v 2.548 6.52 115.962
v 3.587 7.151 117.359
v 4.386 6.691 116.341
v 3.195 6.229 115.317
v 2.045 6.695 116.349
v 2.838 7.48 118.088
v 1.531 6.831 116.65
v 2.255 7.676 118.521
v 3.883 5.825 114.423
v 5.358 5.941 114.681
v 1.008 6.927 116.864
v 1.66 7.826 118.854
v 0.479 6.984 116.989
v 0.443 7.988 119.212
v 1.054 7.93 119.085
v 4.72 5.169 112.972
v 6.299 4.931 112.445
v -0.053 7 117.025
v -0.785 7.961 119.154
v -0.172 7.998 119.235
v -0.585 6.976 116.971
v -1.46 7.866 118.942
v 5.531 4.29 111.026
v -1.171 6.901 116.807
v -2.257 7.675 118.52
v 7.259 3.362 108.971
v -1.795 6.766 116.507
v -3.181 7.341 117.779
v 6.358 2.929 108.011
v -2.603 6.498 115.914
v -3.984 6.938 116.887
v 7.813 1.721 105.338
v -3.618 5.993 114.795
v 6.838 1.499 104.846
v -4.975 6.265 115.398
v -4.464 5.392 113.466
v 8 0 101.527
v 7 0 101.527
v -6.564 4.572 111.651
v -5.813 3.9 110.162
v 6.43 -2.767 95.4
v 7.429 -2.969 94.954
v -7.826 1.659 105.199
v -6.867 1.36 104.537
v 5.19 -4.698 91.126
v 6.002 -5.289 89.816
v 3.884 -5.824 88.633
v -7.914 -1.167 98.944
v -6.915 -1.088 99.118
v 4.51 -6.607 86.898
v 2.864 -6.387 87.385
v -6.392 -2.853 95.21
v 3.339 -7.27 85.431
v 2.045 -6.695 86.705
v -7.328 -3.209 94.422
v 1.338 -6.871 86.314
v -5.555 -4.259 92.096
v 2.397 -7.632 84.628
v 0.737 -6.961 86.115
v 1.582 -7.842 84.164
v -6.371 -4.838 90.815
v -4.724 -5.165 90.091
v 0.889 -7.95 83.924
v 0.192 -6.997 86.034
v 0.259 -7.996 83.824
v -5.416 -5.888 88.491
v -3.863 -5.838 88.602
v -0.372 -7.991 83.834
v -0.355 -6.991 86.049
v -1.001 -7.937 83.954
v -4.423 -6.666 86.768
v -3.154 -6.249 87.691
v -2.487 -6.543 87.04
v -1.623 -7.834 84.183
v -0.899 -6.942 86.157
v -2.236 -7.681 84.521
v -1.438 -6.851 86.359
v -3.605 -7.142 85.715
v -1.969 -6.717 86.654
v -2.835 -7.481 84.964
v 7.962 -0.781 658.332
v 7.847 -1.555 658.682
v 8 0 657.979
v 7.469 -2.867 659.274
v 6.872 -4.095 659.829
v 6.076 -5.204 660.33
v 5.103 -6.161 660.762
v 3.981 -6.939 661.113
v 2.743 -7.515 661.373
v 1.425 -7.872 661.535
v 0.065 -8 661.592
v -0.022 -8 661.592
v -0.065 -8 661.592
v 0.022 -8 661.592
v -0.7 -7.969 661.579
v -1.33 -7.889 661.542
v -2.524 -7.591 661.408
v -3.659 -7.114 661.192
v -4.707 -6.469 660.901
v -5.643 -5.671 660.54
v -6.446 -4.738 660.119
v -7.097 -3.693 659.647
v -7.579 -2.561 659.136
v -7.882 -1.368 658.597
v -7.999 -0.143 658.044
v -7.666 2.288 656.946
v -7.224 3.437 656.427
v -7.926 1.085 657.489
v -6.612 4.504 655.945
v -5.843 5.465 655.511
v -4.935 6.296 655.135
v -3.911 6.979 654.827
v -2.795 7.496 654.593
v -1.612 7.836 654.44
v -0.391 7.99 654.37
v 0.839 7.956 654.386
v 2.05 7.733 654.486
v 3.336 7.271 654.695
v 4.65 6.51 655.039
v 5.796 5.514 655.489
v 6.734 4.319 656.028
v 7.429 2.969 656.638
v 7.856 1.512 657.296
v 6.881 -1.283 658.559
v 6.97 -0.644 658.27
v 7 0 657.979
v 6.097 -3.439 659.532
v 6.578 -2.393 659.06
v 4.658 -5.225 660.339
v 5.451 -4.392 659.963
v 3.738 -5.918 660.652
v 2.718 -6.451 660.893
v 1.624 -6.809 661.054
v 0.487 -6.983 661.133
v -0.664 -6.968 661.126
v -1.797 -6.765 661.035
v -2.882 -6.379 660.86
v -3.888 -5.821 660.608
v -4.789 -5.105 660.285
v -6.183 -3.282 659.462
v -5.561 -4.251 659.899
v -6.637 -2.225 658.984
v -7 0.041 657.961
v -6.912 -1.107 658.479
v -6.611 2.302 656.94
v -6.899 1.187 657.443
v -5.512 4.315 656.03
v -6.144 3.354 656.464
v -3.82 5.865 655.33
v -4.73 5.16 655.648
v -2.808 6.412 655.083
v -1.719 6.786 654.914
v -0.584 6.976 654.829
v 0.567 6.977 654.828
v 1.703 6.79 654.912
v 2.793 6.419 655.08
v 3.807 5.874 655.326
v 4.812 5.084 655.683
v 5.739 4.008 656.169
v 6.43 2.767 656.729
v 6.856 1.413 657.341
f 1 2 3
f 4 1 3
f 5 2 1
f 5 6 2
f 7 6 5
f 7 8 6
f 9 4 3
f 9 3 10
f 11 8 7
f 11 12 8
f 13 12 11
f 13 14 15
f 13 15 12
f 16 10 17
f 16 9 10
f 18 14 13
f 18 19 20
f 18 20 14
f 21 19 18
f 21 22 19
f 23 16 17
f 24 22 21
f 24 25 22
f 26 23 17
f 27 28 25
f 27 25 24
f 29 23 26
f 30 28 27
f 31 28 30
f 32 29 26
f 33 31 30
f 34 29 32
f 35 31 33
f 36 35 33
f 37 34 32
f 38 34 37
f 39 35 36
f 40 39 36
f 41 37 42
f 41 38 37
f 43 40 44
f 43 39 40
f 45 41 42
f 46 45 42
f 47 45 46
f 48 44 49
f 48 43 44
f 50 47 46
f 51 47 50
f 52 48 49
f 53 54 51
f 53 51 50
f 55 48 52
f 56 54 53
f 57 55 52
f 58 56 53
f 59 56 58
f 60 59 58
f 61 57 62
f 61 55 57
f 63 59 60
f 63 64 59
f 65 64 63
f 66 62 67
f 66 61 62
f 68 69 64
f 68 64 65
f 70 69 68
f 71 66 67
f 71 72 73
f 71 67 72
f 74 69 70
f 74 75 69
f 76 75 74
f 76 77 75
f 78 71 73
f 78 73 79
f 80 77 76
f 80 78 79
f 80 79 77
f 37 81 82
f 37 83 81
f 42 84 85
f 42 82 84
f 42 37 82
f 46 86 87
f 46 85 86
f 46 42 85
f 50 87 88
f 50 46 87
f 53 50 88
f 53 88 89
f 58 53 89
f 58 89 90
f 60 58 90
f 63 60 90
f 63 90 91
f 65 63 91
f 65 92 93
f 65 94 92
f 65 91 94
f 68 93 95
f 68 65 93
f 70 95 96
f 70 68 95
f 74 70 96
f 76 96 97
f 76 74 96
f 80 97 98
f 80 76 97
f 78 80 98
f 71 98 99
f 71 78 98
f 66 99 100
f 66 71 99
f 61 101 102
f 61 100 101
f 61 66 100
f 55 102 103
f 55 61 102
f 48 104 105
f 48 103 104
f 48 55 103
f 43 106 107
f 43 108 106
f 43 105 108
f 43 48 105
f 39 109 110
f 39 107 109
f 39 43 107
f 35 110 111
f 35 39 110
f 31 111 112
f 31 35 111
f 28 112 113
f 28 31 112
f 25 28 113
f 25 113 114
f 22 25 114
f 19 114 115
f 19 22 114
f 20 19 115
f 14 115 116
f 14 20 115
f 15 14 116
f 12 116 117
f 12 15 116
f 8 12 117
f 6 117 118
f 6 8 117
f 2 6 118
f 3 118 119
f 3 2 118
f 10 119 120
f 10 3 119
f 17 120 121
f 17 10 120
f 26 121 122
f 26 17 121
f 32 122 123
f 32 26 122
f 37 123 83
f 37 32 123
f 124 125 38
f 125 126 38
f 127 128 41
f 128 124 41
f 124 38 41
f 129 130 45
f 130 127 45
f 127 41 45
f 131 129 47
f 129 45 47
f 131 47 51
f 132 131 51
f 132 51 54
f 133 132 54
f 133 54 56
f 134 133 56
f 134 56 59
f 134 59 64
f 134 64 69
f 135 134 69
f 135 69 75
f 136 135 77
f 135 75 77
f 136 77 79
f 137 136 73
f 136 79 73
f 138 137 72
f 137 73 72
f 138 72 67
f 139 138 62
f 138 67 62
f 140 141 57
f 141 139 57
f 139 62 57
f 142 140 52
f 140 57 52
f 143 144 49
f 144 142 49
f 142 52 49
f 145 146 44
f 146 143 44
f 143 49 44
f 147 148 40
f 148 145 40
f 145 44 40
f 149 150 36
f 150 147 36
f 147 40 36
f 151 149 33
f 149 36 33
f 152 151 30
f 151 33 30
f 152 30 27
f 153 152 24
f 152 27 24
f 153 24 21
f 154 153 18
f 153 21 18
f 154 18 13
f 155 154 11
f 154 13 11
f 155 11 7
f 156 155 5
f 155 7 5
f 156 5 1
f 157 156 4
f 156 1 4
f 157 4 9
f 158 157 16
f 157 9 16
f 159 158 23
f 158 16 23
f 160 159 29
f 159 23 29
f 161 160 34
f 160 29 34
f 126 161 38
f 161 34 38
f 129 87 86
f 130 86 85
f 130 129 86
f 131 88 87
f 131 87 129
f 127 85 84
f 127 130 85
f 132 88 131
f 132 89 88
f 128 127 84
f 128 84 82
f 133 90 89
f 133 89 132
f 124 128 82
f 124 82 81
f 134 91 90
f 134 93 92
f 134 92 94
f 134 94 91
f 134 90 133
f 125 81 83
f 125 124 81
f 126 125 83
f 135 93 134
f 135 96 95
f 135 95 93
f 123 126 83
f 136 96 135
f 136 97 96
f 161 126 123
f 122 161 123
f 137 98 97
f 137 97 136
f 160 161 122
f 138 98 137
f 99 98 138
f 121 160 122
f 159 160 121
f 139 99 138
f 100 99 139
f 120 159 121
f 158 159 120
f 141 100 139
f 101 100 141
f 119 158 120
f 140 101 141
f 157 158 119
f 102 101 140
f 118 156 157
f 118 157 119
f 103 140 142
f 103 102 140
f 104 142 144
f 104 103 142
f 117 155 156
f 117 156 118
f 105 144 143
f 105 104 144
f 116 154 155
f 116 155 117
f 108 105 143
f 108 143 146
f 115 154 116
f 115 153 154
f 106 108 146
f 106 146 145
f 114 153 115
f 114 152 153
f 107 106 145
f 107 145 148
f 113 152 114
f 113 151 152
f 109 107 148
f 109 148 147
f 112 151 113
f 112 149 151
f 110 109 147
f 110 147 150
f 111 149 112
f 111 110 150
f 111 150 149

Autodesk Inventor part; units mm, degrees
ref_plane "Начальная плоскость" through (0, 0, 83.8145) normal (0, 0, 1) x (1, 0, 0)
ref_plane "Конечная плоскость" through (0, 0, 661.5924) normal (0, 0, 1) x (1, 0, 0)
sketch "Эскиз" plane through (0, 0, 0) normal (0, 0, 1) x (1, 0, 0)
  circle A0 centre (0, 0) radius 7
  circle A1 centre (0, 0) radius 8
  dimension "d0" = 16
  dimension "d1" = 1
extrude "Тело" add sketch "Эскиз" along normal up to surface (577.7778 mm away) from surface at 83.8145
sketch "Sketch3" plane through (0, 0, 0) normal (0, 0, 1) x (1, 0, 0)
  line L0 (0, 0) -> (10, 0)
ref_plane "Work Plane3" through (0, 0, 0) normal (0, -1, 0) x (1, 0, 0)
sketch "Sketch4" plane through (0, 0, 0) normal (0, -1, 0) x (1, 0, 0)
  line L0 (-2, 83.8145) -> (12, 83.8145)
  line L1 (-2, 661.5924) -> (12, 661.5924)
  dimension "d7" = 577.7778
ref_plane "РабПлоскость4" through (-8, 209.5676, 565.5202) normal (0, 0.9113542, -0.4116231) x (1, 0, 0)
split "Разделение1" plane through (-8, 209.5676, 565.5202) removes the side toward (0, 0.9113542, -0.4116231)
ref_plane "РабПлоскость5" through (57, 468.0246, 446.5907) normal (0, 0.4116231, 0.9113542) x (1, 0, 0)
split "Разделение2" plane through (57, 468.0246, 446.5907) removes the side toward (0, 0.4116231, 0.9113542)
equation "\"d0\" = G_H"
equation "\"d1\" = G_T"
equation "\"d2\" = G_L"
equation "\"G_H\" = 16"
equation "\"G_T\" = 1"
equation "\"G_L\" = d7"
equation "\"G_OFFSET_START\" = -83.81455"
equation "\"G_OFFSET_END\" = -2.19454"
equation "\"d4\" = -G_OFFSET_START"
equation "\"d5\" = G_OFFSET_END + B_L"
equation "\"B_L\" = 663.78693"
properties part number "Труба 16x1-577,78 ГОСТ 10704-91" material "Сталь, мягкая"
